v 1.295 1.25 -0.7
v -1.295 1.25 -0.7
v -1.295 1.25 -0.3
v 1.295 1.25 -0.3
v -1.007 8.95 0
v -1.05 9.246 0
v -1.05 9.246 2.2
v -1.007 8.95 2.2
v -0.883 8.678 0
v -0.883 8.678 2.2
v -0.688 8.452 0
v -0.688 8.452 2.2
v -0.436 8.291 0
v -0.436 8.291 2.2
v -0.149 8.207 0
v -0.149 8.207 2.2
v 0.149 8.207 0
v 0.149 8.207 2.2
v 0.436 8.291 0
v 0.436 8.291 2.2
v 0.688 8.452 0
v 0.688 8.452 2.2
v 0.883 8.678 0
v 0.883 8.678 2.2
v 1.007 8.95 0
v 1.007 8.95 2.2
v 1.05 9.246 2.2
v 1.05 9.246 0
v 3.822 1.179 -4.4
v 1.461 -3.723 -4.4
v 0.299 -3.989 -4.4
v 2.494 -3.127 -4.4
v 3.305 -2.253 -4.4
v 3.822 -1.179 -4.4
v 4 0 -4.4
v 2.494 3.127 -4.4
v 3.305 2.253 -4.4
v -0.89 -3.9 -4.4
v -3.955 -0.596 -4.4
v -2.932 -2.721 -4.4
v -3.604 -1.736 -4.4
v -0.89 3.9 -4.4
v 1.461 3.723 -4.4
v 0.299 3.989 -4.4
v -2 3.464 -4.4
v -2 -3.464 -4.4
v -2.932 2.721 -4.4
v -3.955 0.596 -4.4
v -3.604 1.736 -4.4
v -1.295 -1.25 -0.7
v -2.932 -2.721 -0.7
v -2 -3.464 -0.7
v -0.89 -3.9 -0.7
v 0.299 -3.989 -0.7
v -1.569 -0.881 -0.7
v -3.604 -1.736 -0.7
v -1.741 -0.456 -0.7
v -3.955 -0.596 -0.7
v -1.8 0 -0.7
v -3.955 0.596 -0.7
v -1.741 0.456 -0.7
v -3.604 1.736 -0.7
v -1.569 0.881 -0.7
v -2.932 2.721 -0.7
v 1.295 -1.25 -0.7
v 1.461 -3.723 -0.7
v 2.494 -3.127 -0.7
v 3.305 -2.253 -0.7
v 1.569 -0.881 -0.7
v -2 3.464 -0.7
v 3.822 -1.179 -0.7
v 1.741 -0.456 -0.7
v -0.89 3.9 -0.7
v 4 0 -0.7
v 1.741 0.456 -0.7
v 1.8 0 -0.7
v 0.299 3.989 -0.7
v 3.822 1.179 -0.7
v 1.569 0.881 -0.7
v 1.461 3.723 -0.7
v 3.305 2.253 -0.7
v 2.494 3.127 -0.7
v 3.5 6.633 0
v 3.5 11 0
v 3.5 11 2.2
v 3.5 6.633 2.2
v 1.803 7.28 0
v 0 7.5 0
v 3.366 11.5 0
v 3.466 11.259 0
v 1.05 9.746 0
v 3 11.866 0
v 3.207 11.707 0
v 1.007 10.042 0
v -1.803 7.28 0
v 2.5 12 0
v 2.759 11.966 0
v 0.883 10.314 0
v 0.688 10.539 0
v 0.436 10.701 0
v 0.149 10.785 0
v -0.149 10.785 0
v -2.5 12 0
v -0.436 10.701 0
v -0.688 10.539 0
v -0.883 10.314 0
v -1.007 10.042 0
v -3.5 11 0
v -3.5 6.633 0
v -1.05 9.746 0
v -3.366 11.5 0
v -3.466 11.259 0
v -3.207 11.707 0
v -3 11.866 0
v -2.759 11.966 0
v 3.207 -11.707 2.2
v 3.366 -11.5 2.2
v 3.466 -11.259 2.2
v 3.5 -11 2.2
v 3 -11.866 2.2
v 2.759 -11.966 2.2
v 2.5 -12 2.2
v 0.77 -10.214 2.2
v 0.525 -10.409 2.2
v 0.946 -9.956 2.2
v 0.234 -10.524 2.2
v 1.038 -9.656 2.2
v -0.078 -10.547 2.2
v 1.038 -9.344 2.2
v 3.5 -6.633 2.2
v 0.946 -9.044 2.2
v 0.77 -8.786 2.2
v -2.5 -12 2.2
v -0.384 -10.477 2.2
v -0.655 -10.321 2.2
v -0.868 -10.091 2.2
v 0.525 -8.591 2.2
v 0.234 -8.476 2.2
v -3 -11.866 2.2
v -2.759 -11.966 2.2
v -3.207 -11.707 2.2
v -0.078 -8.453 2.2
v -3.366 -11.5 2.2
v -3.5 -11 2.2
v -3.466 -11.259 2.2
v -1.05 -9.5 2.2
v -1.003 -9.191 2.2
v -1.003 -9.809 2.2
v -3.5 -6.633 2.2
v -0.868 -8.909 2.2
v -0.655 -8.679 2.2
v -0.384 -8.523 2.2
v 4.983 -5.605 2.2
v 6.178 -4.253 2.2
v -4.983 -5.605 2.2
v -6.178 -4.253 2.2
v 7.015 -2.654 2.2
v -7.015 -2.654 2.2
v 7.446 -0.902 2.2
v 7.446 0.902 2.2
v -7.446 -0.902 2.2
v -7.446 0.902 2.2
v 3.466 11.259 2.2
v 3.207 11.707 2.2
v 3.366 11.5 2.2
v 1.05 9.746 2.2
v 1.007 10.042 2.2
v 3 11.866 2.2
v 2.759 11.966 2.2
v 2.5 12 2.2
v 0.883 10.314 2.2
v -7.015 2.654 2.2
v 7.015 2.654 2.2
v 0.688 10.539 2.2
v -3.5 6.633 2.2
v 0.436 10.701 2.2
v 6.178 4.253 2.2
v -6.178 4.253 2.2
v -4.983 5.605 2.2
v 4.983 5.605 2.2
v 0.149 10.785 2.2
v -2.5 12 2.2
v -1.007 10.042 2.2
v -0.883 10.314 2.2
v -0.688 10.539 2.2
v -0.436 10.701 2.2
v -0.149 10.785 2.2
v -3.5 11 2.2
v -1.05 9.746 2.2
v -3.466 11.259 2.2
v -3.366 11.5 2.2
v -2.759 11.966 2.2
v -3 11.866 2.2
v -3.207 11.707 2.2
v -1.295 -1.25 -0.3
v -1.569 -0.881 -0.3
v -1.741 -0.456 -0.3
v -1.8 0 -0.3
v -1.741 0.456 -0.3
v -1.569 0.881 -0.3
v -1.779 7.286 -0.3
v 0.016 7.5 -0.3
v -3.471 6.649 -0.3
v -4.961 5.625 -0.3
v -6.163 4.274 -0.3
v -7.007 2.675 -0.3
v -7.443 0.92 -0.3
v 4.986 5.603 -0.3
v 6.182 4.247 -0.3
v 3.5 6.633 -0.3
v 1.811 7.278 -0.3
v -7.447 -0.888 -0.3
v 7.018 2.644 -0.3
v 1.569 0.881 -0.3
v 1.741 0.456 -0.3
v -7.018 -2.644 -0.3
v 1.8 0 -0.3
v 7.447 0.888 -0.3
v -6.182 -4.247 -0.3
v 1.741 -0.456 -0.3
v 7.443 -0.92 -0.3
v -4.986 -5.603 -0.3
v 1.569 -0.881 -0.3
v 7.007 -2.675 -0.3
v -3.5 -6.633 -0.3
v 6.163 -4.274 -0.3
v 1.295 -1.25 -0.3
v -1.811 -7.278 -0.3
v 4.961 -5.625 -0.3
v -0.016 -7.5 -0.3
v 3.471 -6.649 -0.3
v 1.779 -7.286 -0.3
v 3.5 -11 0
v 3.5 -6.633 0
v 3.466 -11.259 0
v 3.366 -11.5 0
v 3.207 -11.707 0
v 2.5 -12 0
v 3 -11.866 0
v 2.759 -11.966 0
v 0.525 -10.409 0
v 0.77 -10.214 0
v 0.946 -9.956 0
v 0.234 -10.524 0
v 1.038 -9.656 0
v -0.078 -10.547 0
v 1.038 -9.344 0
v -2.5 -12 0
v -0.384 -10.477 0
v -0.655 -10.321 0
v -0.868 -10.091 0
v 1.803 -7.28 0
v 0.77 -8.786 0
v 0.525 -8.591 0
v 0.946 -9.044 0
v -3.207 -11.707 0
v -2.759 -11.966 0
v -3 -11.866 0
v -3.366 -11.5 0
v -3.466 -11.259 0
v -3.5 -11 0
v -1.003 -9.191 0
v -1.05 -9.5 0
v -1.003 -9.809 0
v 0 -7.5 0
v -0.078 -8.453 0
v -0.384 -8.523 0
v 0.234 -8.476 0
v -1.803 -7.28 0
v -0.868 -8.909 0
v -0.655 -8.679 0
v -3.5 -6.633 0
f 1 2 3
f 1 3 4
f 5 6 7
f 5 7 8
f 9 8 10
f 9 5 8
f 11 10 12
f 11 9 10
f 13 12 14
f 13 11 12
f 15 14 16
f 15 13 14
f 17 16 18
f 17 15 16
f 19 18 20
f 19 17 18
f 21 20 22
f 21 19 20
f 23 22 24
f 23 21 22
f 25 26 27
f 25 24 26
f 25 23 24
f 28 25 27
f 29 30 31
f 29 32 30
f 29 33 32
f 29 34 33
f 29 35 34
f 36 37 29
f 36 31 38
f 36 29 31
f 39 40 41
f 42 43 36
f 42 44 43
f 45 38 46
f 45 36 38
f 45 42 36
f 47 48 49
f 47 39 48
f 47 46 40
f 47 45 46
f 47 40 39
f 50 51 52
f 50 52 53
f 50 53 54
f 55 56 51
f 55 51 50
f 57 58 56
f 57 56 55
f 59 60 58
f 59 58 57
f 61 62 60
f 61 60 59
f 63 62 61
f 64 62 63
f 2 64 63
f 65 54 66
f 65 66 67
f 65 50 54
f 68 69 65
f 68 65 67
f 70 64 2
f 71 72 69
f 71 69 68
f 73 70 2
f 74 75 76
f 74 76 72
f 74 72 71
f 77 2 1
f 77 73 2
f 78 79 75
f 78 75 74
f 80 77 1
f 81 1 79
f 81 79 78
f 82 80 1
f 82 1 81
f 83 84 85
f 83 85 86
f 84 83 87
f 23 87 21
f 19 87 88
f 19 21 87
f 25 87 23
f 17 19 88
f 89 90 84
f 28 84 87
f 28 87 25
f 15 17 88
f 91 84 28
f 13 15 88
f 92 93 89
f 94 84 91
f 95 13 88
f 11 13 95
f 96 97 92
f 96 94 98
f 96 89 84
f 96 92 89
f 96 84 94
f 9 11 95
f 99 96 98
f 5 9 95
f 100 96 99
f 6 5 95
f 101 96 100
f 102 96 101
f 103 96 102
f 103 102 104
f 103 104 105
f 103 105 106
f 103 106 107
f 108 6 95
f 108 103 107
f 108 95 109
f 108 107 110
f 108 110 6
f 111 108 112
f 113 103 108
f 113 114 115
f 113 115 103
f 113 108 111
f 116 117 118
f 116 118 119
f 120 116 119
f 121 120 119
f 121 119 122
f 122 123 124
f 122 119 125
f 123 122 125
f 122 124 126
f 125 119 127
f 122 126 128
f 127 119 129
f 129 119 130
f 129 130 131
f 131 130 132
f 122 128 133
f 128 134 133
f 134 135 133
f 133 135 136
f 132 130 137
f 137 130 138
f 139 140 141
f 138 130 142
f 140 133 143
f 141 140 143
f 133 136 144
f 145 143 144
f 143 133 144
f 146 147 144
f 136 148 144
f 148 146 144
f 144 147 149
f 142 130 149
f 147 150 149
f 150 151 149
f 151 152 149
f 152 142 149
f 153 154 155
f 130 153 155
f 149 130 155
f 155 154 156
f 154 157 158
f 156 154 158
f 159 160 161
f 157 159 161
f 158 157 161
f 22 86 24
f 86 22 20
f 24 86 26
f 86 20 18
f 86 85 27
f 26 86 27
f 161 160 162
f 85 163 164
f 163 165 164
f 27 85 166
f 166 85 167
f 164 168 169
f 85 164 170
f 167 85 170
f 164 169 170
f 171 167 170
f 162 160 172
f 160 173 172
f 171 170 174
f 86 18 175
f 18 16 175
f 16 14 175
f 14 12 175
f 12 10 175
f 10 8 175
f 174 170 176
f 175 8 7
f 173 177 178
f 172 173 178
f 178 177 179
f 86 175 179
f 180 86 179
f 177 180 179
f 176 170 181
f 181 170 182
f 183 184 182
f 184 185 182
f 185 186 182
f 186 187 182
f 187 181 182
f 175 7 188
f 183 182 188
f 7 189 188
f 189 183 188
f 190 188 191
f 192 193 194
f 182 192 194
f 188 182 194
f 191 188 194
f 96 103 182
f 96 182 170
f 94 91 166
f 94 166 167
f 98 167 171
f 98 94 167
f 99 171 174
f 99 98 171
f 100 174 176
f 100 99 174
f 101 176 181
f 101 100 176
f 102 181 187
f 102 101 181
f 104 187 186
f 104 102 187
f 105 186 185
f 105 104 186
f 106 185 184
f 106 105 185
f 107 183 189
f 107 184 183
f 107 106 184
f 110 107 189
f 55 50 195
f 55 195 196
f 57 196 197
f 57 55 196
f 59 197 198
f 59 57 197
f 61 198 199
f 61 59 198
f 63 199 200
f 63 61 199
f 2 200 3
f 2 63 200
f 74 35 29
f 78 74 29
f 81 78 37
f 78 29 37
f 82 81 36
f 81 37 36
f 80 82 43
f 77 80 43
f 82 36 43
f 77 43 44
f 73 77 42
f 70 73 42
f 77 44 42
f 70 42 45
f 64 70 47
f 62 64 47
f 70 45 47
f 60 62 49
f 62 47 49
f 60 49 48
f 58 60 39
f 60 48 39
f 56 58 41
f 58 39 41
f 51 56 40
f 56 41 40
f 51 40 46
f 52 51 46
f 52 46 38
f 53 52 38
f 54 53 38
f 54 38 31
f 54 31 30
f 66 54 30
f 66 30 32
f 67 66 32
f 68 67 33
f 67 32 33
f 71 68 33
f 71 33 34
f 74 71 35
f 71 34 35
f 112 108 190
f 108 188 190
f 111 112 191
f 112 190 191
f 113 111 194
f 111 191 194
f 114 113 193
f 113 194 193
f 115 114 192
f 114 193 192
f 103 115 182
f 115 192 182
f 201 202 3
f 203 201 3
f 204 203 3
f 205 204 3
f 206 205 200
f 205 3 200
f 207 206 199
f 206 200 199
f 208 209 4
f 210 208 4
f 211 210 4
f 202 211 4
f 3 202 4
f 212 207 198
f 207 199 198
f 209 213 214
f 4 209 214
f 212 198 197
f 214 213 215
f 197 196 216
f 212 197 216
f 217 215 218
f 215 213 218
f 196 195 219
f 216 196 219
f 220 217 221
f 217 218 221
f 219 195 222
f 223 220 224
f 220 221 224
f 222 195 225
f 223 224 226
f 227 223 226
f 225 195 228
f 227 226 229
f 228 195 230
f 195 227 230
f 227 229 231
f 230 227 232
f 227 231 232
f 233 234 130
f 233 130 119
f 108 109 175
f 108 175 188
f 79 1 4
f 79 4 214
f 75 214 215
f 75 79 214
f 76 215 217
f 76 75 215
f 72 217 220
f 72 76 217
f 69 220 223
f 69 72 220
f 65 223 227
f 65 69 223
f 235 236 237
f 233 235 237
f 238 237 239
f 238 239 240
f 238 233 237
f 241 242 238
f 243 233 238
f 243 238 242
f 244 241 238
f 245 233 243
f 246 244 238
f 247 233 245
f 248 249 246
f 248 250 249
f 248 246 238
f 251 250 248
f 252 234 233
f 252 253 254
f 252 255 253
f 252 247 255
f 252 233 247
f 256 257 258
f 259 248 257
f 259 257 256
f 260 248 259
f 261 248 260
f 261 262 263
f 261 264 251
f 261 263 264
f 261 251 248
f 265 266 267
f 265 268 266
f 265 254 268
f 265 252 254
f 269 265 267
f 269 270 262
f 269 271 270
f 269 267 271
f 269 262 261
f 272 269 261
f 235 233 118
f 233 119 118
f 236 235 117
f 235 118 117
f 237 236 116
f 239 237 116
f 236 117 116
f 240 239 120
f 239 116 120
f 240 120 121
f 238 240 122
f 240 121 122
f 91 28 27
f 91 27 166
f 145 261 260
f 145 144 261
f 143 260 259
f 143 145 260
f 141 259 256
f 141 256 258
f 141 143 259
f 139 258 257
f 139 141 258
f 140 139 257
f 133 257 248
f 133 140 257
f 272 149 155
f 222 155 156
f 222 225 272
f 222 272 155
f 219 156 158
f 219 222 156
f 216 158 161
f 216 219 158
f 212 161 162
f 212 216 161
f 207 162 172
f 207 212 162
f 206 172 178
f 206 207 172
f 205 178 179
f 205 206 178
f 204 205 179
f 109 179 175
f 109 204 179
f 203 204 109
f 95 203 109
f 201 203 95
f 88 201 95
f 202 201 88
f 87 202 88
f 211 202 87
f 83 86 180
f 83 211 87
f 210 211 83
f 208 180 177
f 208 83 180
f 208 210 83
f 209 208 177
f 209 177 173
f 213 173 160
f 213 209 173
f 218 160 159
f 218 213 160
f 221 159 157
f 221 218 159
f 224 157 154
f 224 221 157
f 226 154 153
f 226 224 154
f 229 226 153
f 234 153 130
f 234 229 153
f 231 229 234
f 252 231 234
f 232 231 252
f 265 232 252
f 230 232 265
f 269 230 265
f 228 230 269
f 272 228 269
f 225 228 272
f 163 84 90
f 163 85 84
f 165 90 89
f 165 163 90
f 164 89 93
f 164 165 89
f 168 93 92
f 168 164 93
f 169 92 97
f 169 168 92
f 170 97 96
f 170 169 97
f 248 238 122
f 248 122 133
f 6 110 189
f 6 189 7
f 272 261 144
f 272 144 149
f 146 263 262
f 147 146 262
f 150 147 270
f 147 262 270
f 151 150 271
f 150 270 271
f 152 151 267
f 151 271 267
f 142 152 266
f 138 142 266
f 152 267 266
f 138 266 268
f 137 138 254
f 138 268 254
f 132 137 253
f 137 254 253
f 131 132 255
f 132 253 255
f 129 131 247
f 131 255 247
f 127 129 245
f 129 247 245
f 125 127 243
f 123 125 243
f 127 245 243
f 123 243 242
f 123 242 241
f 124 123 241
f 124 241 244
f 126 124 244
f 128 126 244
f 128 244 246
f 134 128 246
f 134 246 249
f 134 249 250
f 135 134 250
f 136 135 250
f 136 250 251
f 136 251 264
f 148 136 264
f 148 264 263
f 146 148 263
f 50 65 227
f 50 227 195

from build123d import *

# Parameters (mm, degrees)
BOSS_EXTRUDE1_DEPTH = 2.2
SKETCH2_R           = 7.5
BOSS_EXTRUDE2_DEPTH = 2.5
SKETCH3_R           = 1.05
CUT_EXTRUDE1_DEPTH  = 15.320963655
CUT_EXTRUDE2_REACH  = 16.321
FILLET1_R           = 1
SKETCH5_R           = 4
BOSS_EXTRUDE3_DEPTH = 3.7
BOSS_EXTRUDE4_DEPTH = 4.1


with BuildPart() as part:
    # Sketch1 → Boss-Extrude1 (new body)
    with BuildSketch(Plane.XY):
        with BuildLine():
            Line((-3.5, 12), (3.5, 12))
            Line((3.5, 12), (3.5, 6.633249581))
            ThreePointArc((3.5, 6.633249581), (7.5, 0), (3.5, -6.633249581))
            Line((3.5, -6.633249581), (3.5, -12))
            Line((3.5, -12), (-3.5, -12))
            Line((-3.5, -12), (-3.5, -6.633249581))
            ThreePointArc((-3.5, -6.633249581), (-7.5, 0), (-3.5, 6.633249581))
            Line((-3.5, 6.633249581), (-3.5, 12))
        make_face()
    extrude(amount=BOSS_EXTRUDE1_DEPTH)

    # Sketch2 → Boss-Extrude2 (add)
    with BuildSketch(Plane.XY.offset(2.2)):
        with Locations(Location((0, 0, 0), (0, 0, 242.181860715))):
            Circle(SKETCH2_R)
    extrude(amount=-BOSS_EXTRUDE2_DEPTH)

    # Sketch3 → Cut-Extrude1 (cut, through all)
    with BuildSketch(Plane(origin=(0, 0, 0), x_dir=(-1, 0, 0), z_dir=(0, 0, -1))):
        with Locations((0, -9.5)):
            Circle(SKETCH3_R)
    extrude(amount=-CUT_EXTRUDE1_DEPTH, mode=Mode.SUBTRACT)

    # Sketch4 → Cut-Extrude2 (cut, up to next)
    with BuildSketch(Plane(origin=(0, 0, 0), x_dir=(-1, 0, 0), z_dir=(0, 0, -1)), mode=Mode.PRIVATE) as cut_extrude2_sk1:
        with BuildLine():
            Line((1.05, 9.745840475), (1.05, 9.245840475))
            ThreePointArc((1.05, 9.245840475), (0, 8.195840475), (-1.05, 9.245840475))
            Line((-1.05, 9.245840475), (-1.05, 9.745840475))
            ThreePointArc((-1.05, 9.745840475), (0, 10.795840475), (1.05, 9.745840475))
        make_face()
    cut_extrude2_tool1 = extrude(cut_extrude2_sk1.sketch, amount=-CUT_EXTRUDE2_REACH, mode=Mode.PRIVATE) & part.part
    add(cut_extrude2_tool1.solids().sort_by_distance((0, 9.49584, 0))[0], mode=Mode.SUBTRACT)

    # Fillet1
    fillet1_edges = [part.edges().sort_by_distance(p)[0] for p in [
        (-3.5, 12, 1.1),
        (3.5, 12, 1.1),
        (3.5, -12, 1.1),
        (-3.5, -12, 1.1),
    ]]
    fillet(fillet1_edges, radius=FILLET1_R)



with BuildPart() as body_2:
    # Sketch5 → Boss-Extrude3 (new body)
    with BuildSketch(Plane.XY.offset(-4.4)):
        Circle(SKETCH5_R)
    extrude(amount=BOSS_EXTRUDE3_DEPTH)


with BuildPart() as part_1:
    add(part.part)

    add(body_2.part)  # Boss-Extrude4 merges body 2
    # Sketch6 → Boss-Extrude4 (add)
    with BuildSketch(Plane.XY.offset(-4.4)):
        with BuildLine():
            Line((-1.295183385, 1.25), (1.295183385, 1.25))
            ThreePointArc((1.295183385, 1.25), (1.8, 0), (1.295183385, -1.25))
            Line((1.295183385, -1.25), (-1.295183385, -1.25))
            ThreePointArc((-1.295183385, -1.25), (-1.8, 0), (-1.295183385, 1.25))
        make_face()
    extrude(amount=BOSS_EXTRUDE4_DEPTH)


solid = part_1.part
